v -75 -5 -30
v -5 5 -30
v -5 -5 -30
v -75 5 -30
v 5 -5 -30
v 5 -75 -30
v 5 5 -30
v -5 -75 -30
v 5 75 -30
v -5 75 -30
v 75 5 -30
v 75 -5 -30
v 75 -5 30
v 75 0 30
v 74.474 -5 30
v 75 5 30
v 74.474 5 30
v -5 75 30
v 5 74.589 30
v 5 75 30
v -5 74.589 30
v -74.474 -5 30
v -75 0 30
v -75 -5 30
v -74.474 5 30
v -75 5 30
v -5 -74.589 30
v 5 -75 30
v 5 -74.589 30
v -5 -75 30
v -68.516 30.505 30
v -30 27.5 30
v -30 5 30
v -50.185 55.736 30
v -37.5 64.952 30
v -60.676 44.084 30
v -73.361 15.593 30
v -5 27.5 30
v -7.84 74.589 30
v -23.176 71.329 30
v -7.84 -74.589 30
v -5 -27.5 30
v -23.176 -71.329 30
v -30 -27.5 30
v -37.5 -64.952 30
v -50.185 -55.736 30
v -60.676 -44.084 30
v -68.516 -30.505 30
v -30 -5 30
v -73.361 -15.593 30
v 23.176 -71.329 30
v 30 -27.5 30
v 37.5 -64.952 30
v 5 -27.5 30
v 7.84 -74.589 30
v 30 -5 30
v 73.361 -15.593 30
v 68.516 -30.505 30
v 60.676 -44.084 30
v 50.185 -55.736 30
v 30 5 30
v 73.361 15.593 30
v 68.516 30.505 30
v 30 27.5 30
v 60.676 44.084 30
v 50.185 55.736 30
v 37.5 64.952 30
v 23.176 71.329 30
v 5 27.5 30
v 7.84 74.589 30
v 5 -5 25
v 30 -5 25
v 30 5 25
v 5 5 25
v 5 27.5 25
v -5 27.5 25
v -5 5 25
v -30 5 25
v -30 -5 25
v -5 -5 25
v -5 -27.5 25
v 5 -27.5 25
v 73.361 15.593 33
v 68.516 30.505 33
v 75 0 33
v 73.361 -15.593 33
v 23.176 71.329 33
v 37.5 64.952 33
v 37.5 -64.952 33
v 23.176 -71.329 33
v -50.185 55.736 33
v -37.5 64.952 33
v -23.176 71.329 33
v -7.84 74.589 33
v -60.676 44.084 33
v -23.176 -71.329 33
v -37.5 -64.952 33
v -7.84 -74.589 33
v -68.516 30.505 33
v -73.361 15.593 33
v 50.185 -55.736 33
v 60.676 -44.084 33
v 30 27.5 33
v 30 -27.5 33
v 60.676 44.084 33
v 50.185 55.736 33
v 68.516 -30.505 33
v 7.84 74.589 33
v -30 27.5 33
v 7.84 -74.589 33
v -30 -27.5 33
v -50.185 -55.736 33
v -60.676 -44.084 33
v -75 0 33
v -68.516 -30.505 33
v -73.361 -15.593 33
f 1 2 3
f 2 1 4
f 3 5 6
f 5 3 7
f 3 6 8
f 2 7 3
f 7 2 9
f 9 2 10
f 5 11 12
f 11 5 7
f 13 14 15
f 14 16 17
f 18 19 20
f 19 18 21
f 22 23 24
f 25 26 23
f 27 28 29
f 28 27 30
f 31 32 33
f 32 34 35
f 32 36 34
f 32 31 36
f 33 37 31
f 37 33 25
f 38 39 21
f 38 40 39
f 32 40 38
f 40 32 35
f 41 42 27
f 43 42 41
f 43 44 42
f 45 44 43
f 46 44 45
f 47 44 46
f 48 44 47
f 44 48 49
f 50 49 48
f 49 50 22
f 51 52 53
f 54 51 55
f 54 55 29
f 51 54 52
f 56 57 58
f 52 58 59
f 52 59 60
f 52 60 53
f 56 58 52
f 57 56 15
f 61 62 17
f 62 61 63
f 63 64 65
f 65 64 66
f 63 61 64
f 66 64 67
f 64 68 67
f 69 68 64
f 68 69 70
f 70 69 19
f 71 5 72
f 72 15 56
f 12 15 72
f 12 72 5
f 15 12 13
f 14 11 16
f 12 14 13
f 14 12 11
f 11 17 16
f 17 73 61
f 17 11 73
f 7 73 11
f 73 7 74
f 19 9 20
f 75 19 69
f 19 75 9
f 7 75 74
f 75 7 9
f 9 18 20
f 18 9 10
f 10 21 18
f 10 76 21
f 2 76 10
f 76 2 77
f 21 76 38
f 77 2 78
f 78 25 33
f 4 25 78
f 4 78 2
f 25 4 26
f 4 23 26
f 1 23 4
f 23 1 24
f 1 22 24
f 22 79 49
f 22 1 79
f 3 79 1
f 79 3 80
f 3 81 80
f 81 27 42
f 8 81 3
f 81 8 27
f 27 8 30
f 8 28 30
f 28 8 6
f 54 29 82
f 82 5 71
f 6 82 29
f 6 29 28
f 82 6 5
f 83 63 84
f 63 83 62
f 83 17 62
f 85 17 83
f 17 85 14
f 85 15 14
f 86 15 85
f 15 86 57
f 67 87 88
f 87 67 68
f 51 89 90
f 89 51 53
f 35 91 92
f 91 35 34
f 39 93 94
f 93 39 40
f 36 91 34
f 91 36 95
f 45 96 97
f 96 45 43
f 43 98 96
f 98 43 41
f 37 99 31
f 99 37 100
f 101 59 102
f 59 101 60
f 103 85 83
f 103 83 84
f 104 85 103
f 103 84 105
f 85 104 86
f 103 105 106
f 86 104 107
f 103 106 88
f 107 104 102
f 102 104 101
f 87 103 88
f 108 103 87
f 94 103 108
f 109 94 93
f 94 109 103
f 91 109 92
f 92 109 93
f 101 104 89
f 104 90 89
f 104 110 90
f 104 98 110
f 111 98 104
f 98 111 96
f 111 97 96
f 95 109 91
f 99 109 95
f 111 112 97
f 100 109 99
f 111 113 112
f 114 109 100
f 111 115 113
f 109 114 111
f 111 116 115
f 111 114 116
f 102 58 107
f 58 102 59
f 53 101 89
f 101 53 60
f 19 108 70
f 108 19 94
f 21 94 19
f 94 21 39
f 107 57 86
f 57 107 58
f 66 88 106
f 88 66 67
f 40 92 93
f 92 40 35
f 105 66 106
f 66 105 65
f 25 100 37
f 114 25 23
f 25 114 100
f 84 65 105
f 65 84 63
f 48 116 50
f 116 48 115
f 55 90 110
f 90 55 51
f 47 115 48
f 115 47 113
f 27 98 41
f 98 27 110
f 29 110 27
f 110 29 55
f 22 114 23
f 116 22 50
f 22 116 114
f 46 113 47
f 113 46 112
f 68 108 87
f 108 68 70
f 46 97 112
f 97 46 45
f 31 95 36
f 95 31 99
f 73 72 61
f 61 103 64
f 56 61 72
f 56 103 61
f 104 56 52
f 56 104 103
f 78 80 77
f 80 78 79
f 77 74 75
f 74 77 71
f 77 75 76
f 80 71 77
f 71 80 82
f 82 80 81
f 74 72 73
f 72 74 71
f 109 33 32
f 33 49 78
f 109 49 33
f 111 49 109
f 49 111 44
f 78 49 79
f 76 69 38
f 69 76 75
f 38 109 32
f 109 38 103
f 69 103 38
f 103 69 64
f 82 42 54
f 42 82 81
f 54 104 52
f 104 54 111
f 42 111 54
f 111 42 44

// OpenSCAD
difference() {
	union() {
		linear_extrude(height = 60, center = true, convexity = 10) import (file = "cross.dxf");
		translate([0,0,30]) cylinder(3,75, 75);
	}
	translate([0,0,30]) cube([60,55,10], center=true);
}
